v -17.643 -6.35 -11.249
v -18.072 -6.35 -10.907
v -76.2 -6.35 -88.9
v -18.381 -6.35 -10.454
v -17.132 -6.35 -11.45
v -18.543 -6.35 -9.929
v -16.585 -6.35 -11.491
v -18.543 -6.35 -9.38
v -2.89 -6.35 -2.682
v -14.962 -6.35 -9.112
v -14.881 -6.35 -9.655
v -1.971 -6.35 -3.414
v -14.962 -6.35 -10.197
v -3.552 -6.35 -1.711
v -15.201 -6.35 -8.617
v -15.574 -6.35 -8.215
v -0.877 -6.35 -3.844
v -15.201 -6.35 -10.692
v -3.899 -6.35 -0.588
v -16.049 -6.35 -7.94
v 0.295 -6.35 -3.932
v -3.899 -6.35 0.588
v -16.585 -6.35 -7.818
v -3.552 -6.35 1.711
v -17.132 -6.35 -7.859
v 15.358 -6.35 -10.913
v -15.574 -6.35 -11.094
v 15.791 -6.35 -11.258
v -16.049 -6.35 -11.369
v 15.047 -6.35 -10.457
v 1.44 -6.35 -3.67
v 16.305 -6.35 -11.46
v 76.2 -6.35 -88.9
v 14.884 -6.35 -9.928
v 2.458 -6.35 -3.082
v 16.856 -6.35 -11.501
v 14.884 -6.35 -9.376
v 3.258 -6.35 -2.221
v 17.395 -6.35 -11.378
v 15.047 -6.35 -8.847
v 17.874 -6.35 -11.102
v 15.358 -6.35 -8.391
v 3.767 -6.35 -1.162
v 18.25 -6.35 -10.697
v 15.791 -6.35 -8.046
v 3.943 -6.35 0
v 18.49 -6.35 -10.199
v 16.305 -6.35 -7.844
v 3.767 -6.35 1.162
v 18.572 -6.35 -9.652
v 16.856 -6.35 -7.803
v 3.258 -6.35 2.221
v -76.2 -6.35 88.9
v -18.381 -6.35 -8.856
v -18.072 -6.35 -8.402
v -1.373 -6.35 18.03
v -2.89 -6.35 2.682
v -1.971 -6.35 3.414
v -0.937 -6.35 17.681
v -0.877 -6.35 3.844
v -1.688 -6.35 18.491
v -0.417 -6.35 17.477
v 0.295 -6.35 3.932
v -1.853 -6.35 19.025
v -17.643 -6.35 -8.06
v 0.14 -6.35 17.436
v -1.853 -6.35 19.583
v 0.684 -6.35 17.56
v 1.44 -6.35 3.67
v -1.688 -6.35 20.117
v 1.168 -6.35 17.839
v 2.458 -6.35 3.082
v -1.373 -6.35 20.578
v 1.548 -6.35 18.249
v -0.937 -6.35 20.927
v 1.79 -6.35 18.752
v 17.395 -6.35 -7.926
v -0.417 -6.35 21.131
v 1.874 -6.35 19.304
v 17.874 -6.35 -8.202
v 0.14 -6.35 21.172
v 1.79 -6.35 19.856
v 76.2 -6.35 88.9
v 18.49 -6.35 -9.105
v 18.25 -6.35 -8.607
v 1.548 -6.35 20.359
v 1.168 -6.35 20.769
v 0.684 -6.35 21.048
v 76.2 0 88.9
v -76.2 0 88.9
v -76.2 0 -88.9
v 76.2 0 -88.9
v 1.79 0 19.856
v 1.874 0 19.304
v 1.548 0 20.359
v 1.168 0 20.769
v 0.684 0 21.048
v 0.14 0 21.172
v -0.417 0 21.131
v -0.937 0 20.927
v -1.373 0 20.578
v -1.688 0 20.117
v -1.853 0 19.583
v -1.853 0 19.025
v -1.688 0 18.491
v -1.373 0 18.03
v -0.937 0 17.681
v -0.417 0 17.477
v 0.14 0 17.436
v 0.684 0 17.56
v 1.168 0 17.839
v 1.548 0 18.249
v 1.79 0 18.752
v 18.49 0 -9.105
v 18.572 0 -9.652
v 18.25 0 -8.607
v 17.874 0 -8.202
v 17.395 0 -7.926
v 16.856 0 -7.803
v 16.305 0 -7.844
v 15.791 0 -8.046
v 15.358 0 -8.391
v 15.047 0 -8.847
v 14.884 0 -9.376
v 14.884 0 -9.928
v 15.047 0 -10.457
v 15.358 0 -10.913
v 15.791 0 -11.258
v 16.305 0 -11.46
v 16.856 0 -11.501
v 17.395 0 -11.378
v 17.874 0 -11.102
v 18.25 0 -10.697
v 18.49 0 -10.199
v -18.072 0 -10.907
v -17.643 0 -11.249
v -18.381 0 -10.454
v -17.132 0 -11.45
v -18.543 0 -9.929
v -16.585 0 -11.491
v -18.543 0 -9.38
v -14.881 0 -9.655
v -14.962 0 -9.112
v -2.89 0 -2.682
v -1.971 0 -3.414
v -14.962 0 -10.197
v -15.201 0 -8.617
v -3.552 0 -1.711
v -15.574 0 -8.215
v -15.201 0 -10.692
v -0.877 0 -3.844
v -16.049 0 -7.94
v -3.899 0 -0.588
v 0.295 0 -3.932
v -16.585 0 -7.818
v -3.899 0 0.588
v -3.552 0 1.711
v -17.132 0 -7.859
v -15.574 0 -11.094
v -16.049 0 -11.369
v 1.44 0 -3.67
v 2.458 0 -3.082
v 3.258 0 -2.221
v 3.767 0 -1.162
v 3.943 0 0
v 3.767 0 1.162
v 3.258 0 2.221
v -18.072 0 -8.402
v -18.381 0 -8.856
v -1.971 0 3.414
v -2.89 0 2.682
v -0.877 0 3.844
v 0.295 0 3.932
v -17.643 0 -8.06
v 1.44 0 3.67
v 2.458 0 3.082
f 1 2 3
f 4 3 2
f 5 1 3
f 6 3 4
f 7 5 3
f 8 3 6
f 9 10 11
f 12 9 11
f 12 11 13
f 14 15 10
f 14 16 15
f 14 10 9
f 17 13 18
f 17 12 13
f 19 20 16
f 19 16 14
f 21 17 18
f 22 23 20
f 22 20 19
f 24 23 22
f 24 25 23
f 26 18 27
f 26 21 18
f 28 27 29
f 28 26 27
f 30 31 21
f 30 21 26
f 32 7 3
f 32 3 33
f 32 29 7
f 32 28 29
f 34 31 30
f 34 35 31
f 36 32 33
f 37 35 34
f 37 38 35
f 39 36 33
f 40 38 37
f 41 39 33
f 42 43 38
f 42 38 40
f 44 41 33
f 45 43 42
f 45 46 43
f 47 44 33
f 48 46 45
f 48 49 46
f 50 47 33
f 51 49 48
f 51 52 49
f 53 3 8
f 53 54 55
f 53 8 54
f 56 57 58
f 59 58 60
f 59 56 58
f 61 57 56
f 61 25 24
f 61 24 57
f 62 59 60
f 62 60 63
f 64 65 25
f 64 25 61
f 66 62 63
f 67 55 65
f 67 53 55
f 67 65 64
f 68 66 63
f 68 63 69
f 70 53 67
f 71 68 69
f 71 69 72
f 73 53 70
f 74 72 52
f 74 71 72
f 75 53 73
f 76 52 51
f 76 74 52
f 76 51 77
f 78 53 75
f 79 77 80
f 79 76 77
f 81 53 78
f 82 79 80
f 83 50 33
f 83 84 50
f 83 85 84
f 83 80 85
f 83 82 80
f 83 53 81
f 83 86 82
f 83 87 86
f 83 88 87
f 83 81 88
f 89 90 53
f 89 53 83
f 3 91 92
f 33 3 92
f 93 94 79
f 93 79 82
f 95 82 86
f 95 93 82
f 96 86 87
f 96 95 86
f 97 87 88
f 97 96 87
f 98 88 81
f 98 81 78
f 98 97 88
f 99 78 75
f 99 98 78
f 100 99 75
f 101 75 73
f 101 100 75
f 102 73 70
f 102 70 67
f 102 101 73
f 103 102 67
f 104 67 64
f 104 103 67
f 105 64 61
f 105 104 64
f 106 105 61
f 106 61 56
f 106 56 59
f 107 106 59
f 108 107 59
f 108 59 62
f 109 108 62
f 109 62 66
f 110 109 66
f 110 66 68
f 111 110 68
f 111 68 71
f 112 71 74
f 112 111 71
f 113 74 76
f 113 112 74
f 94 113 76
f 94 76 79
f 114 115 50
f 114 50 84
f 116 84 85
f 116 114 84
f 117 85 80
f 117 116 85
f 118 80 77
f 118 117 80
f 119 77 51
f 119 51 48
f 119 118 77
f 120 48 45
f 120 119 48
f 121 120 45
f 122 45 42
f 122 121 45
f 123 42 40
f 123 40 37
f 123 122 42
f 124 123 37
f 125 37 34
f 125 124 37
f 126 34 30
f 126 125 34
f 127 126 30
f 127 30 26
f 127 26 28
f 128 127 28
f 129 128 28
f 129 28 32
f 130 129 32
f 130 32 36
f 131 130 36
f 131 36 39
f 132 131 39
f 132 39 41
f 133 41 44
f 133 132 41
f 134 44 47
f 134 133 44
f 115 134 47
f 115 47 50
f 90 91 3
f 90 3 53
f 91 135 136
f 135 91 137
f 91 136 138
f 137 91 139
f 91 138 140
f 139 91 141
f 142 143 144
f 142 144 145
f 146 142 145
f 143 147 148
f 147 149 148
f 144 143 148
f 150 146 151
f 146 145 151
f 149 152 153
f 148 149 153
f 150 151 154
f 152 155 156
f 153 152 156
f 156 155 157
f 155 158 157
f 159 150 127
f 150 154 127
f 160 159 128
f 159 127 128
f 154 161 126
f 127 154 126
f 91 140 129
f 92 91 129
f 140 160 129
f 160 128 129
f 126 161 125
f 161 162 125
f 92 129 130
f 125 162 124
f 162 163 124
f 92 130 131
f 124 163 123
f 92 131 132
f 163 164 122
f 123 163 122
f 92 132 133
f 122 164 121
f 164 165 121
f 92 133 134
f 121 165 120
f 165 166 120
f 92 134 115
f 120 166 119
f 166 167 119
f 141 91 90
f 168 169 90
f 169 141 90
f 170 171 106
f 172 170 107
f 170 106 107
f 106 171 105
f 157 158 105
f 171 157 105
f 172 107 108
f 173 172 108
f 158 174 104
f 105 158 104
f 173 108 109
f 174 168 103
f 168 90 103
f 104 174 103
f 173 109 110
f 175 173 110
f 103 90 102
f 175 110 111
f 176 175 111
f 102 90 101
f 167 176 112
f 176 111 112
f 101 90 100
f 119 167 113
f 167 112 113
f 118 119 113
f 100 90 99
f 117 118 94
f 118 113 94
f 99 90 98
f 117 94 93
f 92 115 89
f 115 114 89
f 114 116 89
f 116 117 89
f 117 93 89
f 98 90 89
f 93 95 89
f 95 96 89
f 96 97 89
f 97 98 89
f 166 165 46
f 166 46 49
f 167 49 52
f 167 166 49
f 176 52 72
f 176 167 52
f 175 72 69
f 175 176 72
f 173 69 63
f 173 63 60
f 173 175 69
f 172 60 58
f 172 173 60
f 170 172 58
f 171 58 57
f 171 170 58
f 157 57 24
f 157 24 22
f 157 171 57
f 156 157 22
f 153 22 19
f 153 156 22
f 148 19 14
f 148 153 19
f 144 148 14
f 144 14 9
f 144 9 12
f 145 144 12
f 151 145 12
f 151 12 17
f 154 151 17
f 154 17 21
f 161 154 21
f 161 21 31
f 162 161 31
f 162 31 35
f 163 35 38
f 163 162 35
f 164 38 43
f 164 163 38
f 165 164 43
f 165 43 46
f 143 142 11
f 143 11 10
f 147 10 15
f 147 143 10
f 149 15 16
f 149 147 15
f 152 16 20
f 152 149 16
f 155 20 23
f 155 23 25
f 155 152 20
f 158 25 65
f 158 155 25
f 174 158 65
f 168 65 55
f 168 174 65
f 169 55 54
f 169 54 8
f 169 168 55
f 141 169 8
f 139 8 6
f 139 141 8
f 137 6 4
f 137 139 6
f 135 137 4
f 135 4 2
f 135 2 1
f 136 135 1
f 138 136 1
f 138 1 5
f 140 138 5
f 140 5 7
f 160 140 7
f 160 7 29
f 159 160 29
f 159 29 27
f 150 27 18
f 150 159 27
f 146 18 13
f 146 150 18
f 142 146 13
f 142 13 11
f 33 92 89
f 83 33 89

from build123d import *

# Parameters (mm, degrees)
F0_W     = 152.4
F0_H     = 177.8
F0_R     = 1.8415
F0_R_2   = 1.85447
F0_R_3   = 3.942651
F0_R_4   = 1.873541
F1_DEPTH = 6.35


with BuildPart() as f1:
    # F0 (on Front) → F1 (new body)
    with BuildSketch(Plane.XZ):
        Rectangle(F0_W, F0_H)
        with Locations((-16.722151, -9.654538)):
            Circle(F0_R, mode=Mode.SUBTRACT)
        with Locations((16.717754, -9.652)):
            Circle(F0_R_2, mode=Mode.SUBTRACT)
        Circle(F0_R_3, mode=Mode.SUBTRACT)
        with Locations((0, 19.304)):
            Circle(F0_R_4, mode=Mode.SUBTRACT)
    extrude(amount=F1_DEPTH)


solid = f1.part
